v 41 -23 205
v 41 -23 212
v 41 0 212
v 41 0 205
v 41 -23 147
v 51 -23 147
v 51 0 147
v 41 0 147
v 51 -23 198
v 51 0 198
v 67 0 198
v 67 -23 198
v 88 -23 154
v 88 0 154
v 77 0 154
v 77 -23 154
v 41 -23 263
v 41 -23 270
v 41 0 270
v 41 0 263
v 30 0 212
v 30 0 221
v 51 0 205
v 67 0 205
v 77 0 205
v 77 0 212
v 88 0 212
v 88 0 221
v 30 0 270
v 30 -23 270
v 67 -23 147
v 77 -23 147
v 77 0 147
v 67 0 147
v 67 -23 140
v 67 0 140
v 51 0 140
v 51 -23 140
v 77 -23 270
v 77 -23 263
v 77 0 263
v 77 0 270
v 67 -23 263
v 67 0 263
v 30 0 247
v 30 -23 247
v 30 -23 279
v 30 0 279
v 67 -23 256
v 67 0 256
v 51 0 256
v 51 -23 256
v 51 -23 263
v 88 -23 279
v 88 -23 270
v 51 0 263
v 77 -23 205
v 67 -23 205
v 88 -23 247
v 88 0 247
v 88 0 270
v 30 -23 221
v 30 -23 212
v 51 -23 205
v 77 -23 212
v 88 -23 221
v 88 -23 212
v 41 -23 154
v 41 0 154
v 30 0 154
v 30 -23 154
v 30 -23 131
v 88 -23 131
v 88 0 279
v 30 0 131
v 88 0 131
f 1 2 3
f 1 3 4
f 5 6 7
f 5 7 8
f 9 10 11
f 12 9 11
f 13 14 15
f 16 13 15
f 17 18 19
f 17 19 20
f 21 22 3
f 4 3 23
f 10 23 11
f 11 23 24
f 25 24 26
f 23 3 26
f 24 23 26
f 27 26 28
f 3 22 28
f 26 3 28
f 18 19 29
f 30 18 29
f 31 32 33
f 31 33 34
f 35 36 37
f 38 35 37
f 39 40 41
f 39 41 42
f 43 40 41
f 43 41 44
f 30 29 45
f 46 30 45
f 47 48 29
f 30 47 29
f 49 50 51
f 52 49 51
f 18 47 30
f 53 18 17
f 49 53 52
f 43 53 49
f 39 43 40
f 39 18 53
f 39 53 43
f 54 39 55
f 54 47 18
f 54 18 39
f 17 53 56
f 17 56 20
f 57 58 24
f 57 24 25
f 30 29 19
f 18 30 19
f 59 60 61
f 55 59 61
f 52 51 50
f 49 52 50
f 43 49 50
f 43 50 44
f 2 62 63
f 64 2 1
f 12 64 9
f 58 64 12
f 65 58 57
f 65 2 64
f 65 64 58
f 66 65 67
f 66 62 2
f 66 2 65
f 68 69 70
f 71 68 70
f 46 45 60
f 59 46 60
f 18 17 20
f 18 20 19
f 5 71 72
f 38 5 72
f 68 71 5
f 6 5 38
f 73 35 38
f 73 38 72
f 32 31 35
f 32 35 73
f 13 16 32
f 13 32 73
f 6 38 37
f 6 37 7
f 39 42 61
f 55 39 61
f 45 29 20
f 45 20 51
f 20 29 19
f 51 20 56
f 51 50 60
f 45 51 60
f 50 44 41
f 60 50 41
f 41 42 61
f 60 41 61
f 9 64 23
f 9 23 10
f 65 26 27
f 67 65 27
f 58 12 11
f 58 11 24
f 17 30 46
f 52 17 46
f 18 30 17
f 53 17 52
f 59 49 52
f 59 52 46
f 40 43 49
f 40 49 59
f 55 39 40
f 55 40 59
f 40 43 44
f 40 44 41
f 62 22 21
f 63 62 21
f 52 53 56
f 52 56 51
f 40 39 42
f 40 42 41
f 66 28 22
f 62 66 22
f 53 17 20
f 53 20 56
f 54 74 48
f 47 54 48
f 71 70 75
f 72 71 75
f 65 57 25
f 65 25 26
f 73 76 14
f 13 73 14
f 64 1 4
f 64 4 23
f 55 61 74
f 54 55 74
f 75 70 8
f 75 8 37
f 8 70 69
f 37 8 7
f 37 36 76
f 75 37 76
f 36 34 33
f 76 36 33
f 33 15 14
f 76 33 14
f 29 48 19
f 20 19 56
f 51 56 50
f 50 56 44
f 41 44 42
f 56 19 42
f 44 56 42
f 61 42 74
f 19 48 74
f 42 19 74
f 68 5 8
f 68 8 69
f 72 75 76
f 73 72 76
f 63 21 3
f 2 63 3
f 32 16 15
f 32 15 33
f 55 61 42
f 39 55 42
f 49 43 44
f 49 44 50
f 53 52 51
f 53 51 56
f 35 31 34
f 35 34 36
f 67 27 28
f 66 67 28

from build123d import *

# Parameters (mm, degrees)
F2_DEPTH = 23
F3_DEPTH = 23


# Not quite as in the source:
# - a feature names something its author has since deleted; it is built from what else it names


with BuildPart() as f2:
    # F1 (on Front) → F2 (new body)
    with BuildSketch(Plane.XZ):
        Polygon((30, 279), (30, 270), (41, 270), (41, 263), (51, 263), (51, 256), (59, 256), (67, 256), (67, 263), (77, 263), (77, 270), (88, 270), (88, 279), align=None)
    extrude(amount=F2_DEPTH)


with BuildPart() as f2b:
    # F1 (on Front) → F2, piece 2 (new body)
    with BuildSketch(Plane.XZ):
        Polygon((41, 212), (41, 205), (51, 205), (51, 198), (59, 198), (67, 198), (67, 205), (77, 205), (77, 212), (88, 212), (88, 221), (30, 221), (30, 212), align=None)
    extrude(amount=F2_DEPTH)


with BuildPart() as f2c:
    # F1 (on Front) → F2, piece 3 (new body)
    with BuildSketch(Plane.XZ):
        Polygon((51, 147), (41, 147), (41, 154), (30, 154), (30, 131), (88, 131), (88, 154), (77, 154), (77, 147), (67, 147), (67, 140), (59, 140), (51, 140), align=None)
    extrude(amount=F2_DEPTH)


with BuildPart() as f3:
    # F1 (on Front) → F3 (new body)
    with BuildSketch(Plane.XZ):
        Polygon((41, 270), (30, 270), (30, 247), (88, 247), (88, 270), (77, 270), (77, 263), (67, 263), (67, 256), (59, 256), (51, 256), (51, 263), (41, 263), align=None)
    extrude(amount=F3_DEPTH)


solid = Compound([f2.part, f2b.part, f2c.part, f3.part])
